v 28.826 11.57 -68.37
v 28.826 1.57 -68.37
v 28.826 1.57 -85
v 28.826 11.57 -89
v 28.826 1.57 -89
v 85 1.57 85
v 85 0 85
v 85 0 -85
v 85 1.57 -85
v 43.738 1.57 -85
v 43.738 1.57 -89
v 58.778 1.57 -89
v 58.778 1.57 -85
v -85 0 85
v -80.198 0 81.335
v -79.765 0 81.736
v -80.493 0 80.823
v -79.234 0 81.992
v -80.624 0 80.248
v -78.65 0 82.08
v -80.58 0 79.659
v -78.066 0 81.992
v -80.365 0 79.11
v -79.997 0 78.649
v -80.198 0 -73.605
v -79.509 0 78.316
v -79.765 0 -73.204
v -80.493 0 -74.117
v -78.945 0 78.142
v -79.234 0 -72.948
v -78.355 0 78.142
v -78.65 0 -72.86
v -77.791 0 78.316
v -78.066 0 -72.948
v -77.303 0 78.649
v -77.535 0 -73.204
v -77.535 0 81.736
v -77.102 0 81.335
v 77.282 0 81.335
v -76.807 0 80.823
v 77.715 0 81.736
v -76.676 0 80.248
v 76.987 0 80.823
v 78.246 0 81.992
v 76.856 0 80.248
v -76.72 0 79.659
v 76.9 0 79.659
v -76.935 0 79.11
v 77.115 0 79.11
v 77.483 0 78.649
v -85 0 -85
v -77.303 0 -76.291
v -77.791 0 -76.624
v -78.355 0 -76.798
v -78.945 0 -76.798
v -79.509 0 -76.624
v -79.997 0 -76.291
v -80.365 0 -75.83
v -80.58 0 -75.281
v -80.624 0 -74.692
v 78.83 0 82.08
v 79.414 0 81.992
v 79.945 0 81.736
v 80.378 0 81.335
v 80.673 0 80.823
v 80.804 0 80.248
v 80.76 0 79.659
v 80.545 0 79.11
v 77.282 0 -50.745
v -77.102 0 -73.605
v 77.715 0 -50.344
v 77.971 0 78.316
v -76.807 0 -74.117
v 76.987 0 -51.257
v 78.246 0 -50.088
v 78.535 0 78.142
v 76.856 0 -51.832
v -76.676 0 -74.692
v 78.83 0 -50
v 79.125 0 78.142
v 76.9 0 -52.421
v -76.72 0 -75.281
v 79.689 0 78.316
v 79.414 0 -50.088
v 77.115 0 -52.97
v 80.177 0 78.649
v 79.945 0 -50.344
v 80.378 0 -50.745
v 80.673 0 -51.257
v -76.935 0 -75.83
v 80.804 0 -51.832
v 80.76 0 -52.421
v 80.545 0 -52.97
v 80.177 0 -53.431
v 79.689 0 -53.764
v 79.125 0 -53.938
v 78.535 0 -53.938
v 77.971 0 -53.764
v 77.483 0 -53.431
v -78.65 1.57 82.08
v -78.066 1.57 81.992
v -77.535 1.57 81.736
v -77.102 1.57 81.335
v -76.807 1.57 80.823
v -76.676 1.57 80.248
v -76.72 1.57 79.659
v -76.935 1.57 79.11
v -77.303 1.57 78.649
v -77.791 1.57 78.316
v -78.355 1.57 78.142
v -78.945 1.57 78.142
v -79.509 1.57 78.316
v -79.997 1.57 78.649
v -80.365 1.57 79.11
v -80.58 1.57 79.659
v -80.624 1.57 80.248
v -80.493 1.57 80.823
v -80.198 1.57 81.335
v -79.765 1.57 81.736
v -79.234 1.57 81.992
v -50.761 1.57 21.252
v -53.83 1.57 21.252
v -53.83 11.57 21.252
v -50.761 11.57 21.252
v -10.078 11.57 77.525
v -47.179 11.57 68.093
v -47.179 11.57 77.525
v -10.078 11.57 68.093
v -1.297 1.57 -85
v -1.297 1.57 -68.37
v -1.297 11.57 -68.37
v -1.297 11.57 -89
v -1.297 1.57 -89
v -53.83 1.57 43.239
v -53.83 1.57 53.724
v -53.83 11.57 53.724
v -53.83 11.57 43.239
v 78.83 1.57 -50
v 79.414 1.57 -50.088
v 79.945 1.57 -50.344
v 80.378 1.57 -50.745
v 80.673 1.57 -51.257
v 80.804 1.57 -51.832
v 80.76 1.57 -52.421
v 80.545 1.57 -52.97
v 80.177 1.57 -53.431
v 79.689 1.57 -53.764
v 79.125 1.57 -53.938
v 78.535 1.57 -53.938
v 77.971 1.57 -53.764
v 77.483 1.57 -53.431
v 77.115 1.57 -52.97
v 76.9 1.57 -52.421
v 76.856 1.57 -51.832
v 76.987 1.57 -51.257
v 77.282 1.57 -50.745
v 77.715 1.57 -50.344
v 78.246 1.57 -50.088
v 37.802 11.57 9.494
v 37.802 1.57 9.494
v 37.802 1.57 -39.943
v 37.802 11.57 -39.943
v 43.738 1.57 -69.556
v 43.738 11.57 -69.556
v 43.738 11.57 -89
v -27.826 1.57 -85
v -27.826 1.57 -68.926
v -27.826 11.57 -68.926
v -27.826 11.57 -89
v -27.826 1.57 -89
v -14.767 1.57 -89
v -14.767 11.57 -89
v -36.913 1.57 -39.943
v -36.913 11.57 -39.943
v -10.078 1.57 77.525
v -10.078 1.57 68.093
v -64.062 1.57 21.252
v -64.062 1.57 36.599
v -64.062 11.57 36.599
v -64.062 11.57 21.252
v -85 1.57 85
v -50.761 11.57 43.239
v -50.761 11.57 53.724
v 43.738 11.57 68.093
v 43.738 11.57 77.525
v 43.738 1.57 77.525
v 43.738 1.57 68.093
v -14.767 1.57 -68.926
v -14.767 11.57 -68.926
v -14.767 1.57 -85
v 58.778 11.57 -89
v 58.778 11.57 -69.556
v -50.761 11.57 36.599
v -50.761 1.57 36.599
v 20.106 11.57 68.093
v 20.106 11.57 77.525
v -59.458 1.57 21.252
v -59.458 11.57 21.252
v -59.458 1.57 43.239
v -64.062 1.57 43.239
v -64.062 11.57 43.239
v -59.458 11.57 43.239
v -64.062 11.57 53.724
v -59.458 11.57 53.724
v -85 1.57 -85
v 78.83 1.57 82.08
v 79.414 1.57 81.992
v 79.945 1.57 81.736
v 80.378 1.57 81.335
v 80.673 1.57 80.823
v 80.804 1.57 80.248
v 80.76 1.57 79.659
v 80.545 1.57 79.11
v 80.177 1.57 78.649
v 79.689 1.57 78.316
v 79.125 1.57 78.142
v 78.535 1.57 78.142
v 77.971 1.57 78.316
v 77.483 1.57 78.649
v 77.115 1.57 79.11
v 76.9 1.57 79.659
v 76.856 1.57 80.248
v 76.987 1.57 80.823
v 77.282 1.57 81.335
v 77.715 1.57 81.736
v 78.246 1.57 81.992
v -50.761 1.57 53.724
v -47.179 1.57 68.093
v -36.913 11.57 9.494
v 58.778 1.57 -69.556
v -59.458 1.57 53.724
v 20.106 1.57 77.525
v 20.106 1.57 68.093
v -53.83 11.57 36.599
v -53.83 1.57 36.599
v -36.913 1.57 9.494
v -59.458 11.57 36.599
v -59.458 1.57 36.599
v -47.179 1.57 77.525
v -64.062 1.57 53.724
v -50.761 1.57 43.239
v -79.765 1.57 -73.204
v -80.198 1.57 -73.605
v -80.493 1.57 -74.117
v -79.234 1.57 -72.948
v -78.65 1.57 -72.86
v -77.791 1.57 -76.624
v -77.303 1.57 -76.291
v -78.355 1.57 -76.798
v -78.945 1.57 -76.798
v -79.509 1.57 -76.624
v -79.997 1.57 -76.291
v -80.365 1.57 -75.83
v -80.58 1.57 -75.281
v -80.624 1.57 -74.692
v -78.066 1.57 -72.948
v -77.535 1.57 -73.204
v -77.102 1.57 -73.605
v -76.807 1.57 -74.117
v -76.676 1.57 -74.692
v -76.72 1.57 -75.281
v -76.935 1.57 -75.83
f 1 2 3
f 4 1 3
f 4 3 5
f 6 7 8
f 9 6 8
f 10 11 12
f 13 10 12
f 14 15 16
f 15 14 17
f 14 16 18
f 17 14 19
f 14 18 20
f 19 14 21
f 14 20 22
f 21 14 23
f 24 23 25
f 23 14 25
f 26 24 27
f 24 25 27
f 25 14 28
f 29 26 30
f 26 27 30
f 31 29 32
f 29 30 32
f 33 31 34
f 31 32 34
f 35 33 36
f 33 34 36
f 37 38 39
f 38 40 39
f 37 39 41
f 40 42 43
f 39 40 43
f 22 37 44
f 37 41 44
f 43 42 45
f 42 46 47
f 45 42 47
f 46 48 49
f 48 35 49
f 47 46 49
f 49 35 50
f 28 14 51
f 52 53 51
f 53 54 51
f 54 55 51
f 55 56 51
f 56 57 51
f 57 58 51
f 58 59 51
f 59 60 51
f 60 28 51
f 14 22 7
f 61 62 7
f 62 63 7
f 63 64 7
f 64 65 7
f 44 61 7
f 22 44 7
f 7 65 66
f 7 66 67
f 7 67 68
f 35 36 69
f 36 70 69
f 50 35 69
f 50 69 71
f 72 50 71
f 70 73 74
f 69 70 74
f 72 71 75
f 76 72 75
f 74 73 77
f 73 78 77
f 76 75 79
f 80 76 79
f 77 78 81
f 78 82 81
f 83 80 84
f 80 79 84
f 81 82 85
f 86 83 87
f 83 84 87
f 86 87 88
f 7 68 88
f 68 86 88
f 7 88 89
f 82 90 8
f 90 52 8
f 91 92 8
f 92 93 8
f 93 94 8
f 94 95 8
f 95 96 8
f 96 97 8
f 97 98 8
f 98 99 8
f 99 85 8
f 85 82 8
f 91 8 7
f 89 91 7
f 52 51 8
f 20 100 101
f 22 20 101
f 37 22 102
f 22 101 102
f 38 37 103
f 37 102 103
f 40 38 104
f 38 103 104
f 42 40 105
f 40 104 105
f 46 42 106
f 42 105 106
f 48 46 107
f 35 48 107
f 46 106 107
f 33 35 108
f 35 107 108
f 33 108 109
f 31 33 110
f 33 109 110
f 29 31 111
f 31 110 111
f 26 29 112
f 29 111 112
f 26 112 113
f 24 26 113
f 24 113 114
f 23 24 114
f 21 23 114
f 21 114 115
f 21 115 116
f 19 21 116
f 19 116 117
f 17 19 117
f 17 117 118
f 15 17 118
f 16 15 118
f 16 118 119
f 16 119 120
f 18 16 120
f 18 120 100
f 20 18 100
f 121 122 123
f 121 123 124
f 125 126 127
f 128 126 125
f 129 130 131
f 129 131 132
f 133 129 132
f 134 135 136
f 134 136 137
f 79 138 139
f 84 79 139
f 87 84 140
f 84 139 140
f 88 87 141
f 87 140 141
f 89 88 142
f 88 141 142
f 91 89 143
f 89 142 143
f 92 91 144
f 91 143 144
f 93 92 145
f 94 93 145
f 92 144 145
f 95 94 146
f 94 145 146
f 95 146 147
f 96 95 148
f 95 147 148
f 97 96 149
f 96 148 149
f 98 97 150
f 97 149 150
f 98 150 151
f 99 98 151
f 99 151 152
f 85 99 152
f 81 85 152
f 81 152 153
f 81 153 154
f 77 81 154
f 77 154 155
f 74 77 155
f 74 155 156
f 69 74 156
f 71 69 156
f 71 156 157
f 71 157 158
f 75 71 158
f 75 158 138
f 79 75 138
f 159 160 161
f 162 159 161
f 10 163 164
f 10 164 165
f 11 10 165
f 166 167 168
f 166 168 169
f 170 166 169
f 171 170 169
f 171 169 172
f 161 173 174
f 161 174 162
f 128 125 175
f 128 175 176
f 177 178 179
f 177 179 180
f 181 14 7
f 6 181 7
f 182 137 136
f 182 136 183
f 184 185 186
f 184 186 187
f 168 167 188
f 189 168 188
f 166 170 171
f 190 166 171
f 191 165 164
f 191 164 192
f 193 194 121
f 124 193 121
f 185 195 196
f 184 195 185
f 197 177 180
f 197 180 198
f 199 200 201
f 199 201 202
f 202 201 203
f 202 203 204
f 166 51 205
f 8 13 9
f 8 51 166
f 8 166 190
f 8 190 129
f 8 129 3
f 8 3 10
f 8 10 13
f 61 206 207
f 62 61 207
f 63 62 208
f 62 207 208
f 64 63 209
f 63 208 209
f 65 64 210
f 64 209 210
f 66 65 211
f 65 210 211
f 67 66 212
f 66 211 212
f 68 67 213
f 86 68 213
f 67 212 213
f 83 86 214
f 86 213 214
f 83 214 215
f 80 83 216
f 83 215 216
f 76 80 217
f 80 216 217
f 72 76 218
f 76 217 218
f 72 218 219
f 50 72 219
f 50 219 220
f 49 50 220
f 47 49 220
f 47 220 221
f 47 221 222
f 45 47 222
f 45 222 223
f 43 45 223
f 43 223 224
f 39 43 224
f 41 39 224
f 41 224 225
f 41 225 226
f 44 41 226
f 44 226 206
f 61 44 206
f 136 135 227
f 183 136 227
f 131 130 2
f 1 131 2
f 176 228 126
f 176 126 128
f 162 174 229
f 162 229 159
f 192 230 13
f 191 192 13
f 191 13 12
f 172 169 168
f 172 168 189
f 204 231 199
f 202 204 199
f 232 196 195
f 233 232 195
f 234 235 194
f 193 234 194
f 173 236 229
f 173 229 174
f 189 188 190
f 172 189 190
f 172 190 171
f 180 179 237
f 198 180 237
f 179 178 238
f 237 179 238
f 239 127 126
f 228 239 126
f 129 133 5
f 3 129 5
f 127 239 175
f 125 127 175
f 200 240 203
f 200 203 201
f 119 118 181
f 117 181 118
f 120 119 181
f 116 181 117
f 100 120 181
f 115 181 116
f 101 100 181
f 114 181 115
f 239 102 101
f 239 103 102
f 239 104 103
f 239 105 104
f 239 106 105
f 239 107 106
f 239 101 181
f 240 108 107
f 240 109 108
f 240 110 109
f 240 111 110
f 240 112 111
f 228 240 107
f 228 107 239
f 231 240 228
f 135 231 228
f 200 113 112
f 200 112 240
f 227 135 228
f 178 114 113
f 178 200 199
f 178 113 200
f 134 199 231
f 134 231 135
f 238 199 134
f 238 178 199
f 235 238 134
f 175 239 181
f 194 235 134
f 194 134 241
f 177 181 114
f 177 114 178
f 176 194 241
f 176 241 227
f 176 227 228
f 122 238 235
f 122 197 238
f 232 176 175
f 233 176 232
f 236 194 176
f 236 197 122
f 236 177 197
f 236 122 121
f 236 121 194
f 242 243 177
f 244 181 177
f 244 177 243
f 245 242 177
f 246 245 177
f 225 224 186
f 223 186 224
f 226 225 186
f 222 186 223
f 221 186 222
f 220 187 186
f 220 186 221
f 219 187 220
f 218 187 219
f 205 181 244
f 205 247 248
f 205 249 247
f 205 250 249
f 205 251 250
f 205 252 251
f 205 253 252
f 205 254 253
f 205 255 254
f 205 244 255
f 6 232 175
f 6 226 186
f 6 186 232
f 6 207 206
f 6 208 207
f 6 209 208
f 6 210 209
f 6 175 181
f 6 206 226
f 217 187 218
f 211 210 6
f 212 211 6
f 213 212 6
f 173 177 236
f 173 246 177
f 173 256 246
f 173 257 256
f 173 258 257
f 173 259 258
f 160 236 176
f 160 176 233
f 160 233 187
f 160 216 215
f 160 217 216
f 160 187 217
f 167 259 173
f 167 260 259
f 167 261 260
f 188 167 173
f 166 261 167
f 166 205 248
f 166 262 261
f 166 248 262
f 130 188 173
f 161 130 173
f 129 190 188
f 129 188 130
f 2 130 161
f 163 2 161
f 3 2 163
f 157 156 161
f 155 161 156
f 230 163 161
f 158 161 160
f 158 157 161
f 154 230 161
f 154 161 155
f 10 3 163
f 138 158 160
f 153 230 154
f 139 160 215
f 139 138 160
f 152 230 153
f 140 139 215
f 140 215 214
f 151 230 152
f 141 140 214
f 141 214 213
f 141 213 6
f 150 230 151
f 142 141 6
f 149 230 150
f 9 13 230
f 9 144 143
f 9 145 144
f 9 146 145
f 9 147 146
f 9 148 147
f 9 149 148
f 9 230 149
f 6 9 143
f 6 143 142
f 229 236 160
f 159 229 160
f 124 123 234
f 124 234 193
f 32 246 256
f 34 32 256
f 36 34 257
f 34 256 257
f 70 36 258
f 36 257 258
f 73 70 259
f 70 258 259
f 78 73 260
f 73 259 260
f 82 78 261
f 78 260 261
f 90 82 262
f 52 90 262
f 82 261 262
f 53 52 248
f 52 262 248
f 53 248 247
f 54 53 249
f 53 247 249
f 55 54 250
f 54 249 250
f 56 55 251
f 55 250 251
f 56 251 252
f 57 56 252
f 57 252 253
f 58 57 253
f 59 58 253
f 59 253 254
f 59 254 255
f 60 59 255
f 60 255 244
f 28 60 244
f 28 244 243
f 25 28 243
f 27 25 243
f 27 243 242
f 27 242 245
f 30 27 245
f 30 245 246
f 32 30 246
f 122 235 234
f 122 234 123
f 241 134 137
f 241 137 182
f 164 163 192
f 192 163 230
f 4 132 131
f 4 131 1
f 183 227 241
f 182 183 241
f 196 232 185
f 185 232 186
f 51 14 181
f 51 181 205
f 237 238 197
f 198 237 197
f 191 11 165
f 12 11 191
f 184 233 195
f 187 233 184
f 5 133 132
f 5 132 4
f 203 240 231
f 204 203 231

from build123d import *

# Parameters (mm, degrees)
SKICA1_W                 = 170
SKICA1_H                 = 170
P_IDAT_VYSUNUT_M1_DEPTH  = 1.57
SKICA2_R                 = 1.98
ODEBRAT_VYSUNUT_M1_DEPTH = 121.218404997
SKICA5_W                 = 74.714921367
SKICA5_H                 = 49.436852068
SKICA5_W_2               = 13.058822206
SKICA5_H_2               = 20.074329326
SKICA5_W_3               = 30.123299763
SKICA5_H_3               = 20.63009193
SKICA5_W_4               = 15.040102655
SKICA5_H_4               = 19.44386018
SKICA5_W_5               = 37.10064142
SKICA5_H_5               = 9.432366463
SKICA5_W_6               = 23.63246263
SKICA5_W_7               = 4.604120699
SKICA5_H_6               = 15.347068998
SKICA5_W_8               = 3.0694138
SKICA5_H_7               = 10.485045568
P_IDAT_VYSUNUT_M3_DEPTH  = 10


with BuildPart() as part:
    # Skica1 → Přidat vysunutím1 (new body)
    with BuildSketch(Plane(origin=(0, 0, 0), x_dir=(1, 0, 0), z_dir=(0, 1, 0))):
        Rectangle(SKICA1_W, SKICA1_H)
    extrude(amount=P_IDAT_VYSUNUT_M1_DEPTH)

    # Skica2 → Odebrat vysunutím1 (cut, through all)
    with BuildSketch(Plane(origin=(0, 1.57, 0), x_dir=(1, 0, 0), z_dir=(0, 1, 0))):
        with Locations(Location((-78.65, 74.84, 0), (0, 0, 270))):
            Circle(SKICA2_R)
        with Locations(Location((-78.65, -80.1, 0), (0, 0, 270))):
            Circle(SKICA2_R)
        with Locations(Location((78.83, -80.1, 0), (0, 0, 270))):
            Circle(SKICA2_R)
        with Locations(Location((78.83, 51.98, 0), (0, 0, 270))):
            Circle(SKICA2_R)
    extrude(amount=-ODEBRAT_VYSUNUT_M1_DEPTH, mode=Mode.SUBTRACT)

    # Skica5 → Přidat vysunutím3 (add)
    with BuildSketch(Plane(origin=(0, 1.57, 0), x_dir=(1, 0, 0), z_dir=(0, 1, 0))):
        with Locations((0.444909378, 15.224526197)):
            Rectangle(SKICA5_W, SKICA5_H)
        with Locations((-21.296441518, 78.962835337)):
            Rectangle(SKICA5_W_2, SKICA5_H_2)
        with Locations((13.764534228, 78.684954035)):
            Rectangle(SKICA5_W_3, SKICA5_H_3)
        with Locations((51.258042544, 79.27806991)):
            Rectangle(SKICA5_W_4, SKICA5_H_4)
        with Locations((-28.628364805, -72.809161969)):
            Rectangle(SKICA5_W_5, SKICA5_H_5)
        with Locations((31.921759901, -72.809161969)):
            Rectangle(SKICA5_W_6, SKICA5_H_5)
        with Locations((-61.75978641, -28.925932014)):
            Rectangle(SKICA5_W_7, SKICA5_H_6)
        with Locations((-52.295760528, -28.925932014)):
            Rectangle(SKICA5_W_8, SKICA5_H_6)
        with Locations((-61.75978641, -48.481841274)):
            Rectangle(SKICA5_W_7, SKICA5_H_7)
        with Locations((-52.295760528, -48.481841274)):
            Rectangle(SKICA5_W_8, SKICA5_H_7)
    extrude(amount=P_IDAT_VYSUNUT_M3_DEPTH)


solid = part.part
